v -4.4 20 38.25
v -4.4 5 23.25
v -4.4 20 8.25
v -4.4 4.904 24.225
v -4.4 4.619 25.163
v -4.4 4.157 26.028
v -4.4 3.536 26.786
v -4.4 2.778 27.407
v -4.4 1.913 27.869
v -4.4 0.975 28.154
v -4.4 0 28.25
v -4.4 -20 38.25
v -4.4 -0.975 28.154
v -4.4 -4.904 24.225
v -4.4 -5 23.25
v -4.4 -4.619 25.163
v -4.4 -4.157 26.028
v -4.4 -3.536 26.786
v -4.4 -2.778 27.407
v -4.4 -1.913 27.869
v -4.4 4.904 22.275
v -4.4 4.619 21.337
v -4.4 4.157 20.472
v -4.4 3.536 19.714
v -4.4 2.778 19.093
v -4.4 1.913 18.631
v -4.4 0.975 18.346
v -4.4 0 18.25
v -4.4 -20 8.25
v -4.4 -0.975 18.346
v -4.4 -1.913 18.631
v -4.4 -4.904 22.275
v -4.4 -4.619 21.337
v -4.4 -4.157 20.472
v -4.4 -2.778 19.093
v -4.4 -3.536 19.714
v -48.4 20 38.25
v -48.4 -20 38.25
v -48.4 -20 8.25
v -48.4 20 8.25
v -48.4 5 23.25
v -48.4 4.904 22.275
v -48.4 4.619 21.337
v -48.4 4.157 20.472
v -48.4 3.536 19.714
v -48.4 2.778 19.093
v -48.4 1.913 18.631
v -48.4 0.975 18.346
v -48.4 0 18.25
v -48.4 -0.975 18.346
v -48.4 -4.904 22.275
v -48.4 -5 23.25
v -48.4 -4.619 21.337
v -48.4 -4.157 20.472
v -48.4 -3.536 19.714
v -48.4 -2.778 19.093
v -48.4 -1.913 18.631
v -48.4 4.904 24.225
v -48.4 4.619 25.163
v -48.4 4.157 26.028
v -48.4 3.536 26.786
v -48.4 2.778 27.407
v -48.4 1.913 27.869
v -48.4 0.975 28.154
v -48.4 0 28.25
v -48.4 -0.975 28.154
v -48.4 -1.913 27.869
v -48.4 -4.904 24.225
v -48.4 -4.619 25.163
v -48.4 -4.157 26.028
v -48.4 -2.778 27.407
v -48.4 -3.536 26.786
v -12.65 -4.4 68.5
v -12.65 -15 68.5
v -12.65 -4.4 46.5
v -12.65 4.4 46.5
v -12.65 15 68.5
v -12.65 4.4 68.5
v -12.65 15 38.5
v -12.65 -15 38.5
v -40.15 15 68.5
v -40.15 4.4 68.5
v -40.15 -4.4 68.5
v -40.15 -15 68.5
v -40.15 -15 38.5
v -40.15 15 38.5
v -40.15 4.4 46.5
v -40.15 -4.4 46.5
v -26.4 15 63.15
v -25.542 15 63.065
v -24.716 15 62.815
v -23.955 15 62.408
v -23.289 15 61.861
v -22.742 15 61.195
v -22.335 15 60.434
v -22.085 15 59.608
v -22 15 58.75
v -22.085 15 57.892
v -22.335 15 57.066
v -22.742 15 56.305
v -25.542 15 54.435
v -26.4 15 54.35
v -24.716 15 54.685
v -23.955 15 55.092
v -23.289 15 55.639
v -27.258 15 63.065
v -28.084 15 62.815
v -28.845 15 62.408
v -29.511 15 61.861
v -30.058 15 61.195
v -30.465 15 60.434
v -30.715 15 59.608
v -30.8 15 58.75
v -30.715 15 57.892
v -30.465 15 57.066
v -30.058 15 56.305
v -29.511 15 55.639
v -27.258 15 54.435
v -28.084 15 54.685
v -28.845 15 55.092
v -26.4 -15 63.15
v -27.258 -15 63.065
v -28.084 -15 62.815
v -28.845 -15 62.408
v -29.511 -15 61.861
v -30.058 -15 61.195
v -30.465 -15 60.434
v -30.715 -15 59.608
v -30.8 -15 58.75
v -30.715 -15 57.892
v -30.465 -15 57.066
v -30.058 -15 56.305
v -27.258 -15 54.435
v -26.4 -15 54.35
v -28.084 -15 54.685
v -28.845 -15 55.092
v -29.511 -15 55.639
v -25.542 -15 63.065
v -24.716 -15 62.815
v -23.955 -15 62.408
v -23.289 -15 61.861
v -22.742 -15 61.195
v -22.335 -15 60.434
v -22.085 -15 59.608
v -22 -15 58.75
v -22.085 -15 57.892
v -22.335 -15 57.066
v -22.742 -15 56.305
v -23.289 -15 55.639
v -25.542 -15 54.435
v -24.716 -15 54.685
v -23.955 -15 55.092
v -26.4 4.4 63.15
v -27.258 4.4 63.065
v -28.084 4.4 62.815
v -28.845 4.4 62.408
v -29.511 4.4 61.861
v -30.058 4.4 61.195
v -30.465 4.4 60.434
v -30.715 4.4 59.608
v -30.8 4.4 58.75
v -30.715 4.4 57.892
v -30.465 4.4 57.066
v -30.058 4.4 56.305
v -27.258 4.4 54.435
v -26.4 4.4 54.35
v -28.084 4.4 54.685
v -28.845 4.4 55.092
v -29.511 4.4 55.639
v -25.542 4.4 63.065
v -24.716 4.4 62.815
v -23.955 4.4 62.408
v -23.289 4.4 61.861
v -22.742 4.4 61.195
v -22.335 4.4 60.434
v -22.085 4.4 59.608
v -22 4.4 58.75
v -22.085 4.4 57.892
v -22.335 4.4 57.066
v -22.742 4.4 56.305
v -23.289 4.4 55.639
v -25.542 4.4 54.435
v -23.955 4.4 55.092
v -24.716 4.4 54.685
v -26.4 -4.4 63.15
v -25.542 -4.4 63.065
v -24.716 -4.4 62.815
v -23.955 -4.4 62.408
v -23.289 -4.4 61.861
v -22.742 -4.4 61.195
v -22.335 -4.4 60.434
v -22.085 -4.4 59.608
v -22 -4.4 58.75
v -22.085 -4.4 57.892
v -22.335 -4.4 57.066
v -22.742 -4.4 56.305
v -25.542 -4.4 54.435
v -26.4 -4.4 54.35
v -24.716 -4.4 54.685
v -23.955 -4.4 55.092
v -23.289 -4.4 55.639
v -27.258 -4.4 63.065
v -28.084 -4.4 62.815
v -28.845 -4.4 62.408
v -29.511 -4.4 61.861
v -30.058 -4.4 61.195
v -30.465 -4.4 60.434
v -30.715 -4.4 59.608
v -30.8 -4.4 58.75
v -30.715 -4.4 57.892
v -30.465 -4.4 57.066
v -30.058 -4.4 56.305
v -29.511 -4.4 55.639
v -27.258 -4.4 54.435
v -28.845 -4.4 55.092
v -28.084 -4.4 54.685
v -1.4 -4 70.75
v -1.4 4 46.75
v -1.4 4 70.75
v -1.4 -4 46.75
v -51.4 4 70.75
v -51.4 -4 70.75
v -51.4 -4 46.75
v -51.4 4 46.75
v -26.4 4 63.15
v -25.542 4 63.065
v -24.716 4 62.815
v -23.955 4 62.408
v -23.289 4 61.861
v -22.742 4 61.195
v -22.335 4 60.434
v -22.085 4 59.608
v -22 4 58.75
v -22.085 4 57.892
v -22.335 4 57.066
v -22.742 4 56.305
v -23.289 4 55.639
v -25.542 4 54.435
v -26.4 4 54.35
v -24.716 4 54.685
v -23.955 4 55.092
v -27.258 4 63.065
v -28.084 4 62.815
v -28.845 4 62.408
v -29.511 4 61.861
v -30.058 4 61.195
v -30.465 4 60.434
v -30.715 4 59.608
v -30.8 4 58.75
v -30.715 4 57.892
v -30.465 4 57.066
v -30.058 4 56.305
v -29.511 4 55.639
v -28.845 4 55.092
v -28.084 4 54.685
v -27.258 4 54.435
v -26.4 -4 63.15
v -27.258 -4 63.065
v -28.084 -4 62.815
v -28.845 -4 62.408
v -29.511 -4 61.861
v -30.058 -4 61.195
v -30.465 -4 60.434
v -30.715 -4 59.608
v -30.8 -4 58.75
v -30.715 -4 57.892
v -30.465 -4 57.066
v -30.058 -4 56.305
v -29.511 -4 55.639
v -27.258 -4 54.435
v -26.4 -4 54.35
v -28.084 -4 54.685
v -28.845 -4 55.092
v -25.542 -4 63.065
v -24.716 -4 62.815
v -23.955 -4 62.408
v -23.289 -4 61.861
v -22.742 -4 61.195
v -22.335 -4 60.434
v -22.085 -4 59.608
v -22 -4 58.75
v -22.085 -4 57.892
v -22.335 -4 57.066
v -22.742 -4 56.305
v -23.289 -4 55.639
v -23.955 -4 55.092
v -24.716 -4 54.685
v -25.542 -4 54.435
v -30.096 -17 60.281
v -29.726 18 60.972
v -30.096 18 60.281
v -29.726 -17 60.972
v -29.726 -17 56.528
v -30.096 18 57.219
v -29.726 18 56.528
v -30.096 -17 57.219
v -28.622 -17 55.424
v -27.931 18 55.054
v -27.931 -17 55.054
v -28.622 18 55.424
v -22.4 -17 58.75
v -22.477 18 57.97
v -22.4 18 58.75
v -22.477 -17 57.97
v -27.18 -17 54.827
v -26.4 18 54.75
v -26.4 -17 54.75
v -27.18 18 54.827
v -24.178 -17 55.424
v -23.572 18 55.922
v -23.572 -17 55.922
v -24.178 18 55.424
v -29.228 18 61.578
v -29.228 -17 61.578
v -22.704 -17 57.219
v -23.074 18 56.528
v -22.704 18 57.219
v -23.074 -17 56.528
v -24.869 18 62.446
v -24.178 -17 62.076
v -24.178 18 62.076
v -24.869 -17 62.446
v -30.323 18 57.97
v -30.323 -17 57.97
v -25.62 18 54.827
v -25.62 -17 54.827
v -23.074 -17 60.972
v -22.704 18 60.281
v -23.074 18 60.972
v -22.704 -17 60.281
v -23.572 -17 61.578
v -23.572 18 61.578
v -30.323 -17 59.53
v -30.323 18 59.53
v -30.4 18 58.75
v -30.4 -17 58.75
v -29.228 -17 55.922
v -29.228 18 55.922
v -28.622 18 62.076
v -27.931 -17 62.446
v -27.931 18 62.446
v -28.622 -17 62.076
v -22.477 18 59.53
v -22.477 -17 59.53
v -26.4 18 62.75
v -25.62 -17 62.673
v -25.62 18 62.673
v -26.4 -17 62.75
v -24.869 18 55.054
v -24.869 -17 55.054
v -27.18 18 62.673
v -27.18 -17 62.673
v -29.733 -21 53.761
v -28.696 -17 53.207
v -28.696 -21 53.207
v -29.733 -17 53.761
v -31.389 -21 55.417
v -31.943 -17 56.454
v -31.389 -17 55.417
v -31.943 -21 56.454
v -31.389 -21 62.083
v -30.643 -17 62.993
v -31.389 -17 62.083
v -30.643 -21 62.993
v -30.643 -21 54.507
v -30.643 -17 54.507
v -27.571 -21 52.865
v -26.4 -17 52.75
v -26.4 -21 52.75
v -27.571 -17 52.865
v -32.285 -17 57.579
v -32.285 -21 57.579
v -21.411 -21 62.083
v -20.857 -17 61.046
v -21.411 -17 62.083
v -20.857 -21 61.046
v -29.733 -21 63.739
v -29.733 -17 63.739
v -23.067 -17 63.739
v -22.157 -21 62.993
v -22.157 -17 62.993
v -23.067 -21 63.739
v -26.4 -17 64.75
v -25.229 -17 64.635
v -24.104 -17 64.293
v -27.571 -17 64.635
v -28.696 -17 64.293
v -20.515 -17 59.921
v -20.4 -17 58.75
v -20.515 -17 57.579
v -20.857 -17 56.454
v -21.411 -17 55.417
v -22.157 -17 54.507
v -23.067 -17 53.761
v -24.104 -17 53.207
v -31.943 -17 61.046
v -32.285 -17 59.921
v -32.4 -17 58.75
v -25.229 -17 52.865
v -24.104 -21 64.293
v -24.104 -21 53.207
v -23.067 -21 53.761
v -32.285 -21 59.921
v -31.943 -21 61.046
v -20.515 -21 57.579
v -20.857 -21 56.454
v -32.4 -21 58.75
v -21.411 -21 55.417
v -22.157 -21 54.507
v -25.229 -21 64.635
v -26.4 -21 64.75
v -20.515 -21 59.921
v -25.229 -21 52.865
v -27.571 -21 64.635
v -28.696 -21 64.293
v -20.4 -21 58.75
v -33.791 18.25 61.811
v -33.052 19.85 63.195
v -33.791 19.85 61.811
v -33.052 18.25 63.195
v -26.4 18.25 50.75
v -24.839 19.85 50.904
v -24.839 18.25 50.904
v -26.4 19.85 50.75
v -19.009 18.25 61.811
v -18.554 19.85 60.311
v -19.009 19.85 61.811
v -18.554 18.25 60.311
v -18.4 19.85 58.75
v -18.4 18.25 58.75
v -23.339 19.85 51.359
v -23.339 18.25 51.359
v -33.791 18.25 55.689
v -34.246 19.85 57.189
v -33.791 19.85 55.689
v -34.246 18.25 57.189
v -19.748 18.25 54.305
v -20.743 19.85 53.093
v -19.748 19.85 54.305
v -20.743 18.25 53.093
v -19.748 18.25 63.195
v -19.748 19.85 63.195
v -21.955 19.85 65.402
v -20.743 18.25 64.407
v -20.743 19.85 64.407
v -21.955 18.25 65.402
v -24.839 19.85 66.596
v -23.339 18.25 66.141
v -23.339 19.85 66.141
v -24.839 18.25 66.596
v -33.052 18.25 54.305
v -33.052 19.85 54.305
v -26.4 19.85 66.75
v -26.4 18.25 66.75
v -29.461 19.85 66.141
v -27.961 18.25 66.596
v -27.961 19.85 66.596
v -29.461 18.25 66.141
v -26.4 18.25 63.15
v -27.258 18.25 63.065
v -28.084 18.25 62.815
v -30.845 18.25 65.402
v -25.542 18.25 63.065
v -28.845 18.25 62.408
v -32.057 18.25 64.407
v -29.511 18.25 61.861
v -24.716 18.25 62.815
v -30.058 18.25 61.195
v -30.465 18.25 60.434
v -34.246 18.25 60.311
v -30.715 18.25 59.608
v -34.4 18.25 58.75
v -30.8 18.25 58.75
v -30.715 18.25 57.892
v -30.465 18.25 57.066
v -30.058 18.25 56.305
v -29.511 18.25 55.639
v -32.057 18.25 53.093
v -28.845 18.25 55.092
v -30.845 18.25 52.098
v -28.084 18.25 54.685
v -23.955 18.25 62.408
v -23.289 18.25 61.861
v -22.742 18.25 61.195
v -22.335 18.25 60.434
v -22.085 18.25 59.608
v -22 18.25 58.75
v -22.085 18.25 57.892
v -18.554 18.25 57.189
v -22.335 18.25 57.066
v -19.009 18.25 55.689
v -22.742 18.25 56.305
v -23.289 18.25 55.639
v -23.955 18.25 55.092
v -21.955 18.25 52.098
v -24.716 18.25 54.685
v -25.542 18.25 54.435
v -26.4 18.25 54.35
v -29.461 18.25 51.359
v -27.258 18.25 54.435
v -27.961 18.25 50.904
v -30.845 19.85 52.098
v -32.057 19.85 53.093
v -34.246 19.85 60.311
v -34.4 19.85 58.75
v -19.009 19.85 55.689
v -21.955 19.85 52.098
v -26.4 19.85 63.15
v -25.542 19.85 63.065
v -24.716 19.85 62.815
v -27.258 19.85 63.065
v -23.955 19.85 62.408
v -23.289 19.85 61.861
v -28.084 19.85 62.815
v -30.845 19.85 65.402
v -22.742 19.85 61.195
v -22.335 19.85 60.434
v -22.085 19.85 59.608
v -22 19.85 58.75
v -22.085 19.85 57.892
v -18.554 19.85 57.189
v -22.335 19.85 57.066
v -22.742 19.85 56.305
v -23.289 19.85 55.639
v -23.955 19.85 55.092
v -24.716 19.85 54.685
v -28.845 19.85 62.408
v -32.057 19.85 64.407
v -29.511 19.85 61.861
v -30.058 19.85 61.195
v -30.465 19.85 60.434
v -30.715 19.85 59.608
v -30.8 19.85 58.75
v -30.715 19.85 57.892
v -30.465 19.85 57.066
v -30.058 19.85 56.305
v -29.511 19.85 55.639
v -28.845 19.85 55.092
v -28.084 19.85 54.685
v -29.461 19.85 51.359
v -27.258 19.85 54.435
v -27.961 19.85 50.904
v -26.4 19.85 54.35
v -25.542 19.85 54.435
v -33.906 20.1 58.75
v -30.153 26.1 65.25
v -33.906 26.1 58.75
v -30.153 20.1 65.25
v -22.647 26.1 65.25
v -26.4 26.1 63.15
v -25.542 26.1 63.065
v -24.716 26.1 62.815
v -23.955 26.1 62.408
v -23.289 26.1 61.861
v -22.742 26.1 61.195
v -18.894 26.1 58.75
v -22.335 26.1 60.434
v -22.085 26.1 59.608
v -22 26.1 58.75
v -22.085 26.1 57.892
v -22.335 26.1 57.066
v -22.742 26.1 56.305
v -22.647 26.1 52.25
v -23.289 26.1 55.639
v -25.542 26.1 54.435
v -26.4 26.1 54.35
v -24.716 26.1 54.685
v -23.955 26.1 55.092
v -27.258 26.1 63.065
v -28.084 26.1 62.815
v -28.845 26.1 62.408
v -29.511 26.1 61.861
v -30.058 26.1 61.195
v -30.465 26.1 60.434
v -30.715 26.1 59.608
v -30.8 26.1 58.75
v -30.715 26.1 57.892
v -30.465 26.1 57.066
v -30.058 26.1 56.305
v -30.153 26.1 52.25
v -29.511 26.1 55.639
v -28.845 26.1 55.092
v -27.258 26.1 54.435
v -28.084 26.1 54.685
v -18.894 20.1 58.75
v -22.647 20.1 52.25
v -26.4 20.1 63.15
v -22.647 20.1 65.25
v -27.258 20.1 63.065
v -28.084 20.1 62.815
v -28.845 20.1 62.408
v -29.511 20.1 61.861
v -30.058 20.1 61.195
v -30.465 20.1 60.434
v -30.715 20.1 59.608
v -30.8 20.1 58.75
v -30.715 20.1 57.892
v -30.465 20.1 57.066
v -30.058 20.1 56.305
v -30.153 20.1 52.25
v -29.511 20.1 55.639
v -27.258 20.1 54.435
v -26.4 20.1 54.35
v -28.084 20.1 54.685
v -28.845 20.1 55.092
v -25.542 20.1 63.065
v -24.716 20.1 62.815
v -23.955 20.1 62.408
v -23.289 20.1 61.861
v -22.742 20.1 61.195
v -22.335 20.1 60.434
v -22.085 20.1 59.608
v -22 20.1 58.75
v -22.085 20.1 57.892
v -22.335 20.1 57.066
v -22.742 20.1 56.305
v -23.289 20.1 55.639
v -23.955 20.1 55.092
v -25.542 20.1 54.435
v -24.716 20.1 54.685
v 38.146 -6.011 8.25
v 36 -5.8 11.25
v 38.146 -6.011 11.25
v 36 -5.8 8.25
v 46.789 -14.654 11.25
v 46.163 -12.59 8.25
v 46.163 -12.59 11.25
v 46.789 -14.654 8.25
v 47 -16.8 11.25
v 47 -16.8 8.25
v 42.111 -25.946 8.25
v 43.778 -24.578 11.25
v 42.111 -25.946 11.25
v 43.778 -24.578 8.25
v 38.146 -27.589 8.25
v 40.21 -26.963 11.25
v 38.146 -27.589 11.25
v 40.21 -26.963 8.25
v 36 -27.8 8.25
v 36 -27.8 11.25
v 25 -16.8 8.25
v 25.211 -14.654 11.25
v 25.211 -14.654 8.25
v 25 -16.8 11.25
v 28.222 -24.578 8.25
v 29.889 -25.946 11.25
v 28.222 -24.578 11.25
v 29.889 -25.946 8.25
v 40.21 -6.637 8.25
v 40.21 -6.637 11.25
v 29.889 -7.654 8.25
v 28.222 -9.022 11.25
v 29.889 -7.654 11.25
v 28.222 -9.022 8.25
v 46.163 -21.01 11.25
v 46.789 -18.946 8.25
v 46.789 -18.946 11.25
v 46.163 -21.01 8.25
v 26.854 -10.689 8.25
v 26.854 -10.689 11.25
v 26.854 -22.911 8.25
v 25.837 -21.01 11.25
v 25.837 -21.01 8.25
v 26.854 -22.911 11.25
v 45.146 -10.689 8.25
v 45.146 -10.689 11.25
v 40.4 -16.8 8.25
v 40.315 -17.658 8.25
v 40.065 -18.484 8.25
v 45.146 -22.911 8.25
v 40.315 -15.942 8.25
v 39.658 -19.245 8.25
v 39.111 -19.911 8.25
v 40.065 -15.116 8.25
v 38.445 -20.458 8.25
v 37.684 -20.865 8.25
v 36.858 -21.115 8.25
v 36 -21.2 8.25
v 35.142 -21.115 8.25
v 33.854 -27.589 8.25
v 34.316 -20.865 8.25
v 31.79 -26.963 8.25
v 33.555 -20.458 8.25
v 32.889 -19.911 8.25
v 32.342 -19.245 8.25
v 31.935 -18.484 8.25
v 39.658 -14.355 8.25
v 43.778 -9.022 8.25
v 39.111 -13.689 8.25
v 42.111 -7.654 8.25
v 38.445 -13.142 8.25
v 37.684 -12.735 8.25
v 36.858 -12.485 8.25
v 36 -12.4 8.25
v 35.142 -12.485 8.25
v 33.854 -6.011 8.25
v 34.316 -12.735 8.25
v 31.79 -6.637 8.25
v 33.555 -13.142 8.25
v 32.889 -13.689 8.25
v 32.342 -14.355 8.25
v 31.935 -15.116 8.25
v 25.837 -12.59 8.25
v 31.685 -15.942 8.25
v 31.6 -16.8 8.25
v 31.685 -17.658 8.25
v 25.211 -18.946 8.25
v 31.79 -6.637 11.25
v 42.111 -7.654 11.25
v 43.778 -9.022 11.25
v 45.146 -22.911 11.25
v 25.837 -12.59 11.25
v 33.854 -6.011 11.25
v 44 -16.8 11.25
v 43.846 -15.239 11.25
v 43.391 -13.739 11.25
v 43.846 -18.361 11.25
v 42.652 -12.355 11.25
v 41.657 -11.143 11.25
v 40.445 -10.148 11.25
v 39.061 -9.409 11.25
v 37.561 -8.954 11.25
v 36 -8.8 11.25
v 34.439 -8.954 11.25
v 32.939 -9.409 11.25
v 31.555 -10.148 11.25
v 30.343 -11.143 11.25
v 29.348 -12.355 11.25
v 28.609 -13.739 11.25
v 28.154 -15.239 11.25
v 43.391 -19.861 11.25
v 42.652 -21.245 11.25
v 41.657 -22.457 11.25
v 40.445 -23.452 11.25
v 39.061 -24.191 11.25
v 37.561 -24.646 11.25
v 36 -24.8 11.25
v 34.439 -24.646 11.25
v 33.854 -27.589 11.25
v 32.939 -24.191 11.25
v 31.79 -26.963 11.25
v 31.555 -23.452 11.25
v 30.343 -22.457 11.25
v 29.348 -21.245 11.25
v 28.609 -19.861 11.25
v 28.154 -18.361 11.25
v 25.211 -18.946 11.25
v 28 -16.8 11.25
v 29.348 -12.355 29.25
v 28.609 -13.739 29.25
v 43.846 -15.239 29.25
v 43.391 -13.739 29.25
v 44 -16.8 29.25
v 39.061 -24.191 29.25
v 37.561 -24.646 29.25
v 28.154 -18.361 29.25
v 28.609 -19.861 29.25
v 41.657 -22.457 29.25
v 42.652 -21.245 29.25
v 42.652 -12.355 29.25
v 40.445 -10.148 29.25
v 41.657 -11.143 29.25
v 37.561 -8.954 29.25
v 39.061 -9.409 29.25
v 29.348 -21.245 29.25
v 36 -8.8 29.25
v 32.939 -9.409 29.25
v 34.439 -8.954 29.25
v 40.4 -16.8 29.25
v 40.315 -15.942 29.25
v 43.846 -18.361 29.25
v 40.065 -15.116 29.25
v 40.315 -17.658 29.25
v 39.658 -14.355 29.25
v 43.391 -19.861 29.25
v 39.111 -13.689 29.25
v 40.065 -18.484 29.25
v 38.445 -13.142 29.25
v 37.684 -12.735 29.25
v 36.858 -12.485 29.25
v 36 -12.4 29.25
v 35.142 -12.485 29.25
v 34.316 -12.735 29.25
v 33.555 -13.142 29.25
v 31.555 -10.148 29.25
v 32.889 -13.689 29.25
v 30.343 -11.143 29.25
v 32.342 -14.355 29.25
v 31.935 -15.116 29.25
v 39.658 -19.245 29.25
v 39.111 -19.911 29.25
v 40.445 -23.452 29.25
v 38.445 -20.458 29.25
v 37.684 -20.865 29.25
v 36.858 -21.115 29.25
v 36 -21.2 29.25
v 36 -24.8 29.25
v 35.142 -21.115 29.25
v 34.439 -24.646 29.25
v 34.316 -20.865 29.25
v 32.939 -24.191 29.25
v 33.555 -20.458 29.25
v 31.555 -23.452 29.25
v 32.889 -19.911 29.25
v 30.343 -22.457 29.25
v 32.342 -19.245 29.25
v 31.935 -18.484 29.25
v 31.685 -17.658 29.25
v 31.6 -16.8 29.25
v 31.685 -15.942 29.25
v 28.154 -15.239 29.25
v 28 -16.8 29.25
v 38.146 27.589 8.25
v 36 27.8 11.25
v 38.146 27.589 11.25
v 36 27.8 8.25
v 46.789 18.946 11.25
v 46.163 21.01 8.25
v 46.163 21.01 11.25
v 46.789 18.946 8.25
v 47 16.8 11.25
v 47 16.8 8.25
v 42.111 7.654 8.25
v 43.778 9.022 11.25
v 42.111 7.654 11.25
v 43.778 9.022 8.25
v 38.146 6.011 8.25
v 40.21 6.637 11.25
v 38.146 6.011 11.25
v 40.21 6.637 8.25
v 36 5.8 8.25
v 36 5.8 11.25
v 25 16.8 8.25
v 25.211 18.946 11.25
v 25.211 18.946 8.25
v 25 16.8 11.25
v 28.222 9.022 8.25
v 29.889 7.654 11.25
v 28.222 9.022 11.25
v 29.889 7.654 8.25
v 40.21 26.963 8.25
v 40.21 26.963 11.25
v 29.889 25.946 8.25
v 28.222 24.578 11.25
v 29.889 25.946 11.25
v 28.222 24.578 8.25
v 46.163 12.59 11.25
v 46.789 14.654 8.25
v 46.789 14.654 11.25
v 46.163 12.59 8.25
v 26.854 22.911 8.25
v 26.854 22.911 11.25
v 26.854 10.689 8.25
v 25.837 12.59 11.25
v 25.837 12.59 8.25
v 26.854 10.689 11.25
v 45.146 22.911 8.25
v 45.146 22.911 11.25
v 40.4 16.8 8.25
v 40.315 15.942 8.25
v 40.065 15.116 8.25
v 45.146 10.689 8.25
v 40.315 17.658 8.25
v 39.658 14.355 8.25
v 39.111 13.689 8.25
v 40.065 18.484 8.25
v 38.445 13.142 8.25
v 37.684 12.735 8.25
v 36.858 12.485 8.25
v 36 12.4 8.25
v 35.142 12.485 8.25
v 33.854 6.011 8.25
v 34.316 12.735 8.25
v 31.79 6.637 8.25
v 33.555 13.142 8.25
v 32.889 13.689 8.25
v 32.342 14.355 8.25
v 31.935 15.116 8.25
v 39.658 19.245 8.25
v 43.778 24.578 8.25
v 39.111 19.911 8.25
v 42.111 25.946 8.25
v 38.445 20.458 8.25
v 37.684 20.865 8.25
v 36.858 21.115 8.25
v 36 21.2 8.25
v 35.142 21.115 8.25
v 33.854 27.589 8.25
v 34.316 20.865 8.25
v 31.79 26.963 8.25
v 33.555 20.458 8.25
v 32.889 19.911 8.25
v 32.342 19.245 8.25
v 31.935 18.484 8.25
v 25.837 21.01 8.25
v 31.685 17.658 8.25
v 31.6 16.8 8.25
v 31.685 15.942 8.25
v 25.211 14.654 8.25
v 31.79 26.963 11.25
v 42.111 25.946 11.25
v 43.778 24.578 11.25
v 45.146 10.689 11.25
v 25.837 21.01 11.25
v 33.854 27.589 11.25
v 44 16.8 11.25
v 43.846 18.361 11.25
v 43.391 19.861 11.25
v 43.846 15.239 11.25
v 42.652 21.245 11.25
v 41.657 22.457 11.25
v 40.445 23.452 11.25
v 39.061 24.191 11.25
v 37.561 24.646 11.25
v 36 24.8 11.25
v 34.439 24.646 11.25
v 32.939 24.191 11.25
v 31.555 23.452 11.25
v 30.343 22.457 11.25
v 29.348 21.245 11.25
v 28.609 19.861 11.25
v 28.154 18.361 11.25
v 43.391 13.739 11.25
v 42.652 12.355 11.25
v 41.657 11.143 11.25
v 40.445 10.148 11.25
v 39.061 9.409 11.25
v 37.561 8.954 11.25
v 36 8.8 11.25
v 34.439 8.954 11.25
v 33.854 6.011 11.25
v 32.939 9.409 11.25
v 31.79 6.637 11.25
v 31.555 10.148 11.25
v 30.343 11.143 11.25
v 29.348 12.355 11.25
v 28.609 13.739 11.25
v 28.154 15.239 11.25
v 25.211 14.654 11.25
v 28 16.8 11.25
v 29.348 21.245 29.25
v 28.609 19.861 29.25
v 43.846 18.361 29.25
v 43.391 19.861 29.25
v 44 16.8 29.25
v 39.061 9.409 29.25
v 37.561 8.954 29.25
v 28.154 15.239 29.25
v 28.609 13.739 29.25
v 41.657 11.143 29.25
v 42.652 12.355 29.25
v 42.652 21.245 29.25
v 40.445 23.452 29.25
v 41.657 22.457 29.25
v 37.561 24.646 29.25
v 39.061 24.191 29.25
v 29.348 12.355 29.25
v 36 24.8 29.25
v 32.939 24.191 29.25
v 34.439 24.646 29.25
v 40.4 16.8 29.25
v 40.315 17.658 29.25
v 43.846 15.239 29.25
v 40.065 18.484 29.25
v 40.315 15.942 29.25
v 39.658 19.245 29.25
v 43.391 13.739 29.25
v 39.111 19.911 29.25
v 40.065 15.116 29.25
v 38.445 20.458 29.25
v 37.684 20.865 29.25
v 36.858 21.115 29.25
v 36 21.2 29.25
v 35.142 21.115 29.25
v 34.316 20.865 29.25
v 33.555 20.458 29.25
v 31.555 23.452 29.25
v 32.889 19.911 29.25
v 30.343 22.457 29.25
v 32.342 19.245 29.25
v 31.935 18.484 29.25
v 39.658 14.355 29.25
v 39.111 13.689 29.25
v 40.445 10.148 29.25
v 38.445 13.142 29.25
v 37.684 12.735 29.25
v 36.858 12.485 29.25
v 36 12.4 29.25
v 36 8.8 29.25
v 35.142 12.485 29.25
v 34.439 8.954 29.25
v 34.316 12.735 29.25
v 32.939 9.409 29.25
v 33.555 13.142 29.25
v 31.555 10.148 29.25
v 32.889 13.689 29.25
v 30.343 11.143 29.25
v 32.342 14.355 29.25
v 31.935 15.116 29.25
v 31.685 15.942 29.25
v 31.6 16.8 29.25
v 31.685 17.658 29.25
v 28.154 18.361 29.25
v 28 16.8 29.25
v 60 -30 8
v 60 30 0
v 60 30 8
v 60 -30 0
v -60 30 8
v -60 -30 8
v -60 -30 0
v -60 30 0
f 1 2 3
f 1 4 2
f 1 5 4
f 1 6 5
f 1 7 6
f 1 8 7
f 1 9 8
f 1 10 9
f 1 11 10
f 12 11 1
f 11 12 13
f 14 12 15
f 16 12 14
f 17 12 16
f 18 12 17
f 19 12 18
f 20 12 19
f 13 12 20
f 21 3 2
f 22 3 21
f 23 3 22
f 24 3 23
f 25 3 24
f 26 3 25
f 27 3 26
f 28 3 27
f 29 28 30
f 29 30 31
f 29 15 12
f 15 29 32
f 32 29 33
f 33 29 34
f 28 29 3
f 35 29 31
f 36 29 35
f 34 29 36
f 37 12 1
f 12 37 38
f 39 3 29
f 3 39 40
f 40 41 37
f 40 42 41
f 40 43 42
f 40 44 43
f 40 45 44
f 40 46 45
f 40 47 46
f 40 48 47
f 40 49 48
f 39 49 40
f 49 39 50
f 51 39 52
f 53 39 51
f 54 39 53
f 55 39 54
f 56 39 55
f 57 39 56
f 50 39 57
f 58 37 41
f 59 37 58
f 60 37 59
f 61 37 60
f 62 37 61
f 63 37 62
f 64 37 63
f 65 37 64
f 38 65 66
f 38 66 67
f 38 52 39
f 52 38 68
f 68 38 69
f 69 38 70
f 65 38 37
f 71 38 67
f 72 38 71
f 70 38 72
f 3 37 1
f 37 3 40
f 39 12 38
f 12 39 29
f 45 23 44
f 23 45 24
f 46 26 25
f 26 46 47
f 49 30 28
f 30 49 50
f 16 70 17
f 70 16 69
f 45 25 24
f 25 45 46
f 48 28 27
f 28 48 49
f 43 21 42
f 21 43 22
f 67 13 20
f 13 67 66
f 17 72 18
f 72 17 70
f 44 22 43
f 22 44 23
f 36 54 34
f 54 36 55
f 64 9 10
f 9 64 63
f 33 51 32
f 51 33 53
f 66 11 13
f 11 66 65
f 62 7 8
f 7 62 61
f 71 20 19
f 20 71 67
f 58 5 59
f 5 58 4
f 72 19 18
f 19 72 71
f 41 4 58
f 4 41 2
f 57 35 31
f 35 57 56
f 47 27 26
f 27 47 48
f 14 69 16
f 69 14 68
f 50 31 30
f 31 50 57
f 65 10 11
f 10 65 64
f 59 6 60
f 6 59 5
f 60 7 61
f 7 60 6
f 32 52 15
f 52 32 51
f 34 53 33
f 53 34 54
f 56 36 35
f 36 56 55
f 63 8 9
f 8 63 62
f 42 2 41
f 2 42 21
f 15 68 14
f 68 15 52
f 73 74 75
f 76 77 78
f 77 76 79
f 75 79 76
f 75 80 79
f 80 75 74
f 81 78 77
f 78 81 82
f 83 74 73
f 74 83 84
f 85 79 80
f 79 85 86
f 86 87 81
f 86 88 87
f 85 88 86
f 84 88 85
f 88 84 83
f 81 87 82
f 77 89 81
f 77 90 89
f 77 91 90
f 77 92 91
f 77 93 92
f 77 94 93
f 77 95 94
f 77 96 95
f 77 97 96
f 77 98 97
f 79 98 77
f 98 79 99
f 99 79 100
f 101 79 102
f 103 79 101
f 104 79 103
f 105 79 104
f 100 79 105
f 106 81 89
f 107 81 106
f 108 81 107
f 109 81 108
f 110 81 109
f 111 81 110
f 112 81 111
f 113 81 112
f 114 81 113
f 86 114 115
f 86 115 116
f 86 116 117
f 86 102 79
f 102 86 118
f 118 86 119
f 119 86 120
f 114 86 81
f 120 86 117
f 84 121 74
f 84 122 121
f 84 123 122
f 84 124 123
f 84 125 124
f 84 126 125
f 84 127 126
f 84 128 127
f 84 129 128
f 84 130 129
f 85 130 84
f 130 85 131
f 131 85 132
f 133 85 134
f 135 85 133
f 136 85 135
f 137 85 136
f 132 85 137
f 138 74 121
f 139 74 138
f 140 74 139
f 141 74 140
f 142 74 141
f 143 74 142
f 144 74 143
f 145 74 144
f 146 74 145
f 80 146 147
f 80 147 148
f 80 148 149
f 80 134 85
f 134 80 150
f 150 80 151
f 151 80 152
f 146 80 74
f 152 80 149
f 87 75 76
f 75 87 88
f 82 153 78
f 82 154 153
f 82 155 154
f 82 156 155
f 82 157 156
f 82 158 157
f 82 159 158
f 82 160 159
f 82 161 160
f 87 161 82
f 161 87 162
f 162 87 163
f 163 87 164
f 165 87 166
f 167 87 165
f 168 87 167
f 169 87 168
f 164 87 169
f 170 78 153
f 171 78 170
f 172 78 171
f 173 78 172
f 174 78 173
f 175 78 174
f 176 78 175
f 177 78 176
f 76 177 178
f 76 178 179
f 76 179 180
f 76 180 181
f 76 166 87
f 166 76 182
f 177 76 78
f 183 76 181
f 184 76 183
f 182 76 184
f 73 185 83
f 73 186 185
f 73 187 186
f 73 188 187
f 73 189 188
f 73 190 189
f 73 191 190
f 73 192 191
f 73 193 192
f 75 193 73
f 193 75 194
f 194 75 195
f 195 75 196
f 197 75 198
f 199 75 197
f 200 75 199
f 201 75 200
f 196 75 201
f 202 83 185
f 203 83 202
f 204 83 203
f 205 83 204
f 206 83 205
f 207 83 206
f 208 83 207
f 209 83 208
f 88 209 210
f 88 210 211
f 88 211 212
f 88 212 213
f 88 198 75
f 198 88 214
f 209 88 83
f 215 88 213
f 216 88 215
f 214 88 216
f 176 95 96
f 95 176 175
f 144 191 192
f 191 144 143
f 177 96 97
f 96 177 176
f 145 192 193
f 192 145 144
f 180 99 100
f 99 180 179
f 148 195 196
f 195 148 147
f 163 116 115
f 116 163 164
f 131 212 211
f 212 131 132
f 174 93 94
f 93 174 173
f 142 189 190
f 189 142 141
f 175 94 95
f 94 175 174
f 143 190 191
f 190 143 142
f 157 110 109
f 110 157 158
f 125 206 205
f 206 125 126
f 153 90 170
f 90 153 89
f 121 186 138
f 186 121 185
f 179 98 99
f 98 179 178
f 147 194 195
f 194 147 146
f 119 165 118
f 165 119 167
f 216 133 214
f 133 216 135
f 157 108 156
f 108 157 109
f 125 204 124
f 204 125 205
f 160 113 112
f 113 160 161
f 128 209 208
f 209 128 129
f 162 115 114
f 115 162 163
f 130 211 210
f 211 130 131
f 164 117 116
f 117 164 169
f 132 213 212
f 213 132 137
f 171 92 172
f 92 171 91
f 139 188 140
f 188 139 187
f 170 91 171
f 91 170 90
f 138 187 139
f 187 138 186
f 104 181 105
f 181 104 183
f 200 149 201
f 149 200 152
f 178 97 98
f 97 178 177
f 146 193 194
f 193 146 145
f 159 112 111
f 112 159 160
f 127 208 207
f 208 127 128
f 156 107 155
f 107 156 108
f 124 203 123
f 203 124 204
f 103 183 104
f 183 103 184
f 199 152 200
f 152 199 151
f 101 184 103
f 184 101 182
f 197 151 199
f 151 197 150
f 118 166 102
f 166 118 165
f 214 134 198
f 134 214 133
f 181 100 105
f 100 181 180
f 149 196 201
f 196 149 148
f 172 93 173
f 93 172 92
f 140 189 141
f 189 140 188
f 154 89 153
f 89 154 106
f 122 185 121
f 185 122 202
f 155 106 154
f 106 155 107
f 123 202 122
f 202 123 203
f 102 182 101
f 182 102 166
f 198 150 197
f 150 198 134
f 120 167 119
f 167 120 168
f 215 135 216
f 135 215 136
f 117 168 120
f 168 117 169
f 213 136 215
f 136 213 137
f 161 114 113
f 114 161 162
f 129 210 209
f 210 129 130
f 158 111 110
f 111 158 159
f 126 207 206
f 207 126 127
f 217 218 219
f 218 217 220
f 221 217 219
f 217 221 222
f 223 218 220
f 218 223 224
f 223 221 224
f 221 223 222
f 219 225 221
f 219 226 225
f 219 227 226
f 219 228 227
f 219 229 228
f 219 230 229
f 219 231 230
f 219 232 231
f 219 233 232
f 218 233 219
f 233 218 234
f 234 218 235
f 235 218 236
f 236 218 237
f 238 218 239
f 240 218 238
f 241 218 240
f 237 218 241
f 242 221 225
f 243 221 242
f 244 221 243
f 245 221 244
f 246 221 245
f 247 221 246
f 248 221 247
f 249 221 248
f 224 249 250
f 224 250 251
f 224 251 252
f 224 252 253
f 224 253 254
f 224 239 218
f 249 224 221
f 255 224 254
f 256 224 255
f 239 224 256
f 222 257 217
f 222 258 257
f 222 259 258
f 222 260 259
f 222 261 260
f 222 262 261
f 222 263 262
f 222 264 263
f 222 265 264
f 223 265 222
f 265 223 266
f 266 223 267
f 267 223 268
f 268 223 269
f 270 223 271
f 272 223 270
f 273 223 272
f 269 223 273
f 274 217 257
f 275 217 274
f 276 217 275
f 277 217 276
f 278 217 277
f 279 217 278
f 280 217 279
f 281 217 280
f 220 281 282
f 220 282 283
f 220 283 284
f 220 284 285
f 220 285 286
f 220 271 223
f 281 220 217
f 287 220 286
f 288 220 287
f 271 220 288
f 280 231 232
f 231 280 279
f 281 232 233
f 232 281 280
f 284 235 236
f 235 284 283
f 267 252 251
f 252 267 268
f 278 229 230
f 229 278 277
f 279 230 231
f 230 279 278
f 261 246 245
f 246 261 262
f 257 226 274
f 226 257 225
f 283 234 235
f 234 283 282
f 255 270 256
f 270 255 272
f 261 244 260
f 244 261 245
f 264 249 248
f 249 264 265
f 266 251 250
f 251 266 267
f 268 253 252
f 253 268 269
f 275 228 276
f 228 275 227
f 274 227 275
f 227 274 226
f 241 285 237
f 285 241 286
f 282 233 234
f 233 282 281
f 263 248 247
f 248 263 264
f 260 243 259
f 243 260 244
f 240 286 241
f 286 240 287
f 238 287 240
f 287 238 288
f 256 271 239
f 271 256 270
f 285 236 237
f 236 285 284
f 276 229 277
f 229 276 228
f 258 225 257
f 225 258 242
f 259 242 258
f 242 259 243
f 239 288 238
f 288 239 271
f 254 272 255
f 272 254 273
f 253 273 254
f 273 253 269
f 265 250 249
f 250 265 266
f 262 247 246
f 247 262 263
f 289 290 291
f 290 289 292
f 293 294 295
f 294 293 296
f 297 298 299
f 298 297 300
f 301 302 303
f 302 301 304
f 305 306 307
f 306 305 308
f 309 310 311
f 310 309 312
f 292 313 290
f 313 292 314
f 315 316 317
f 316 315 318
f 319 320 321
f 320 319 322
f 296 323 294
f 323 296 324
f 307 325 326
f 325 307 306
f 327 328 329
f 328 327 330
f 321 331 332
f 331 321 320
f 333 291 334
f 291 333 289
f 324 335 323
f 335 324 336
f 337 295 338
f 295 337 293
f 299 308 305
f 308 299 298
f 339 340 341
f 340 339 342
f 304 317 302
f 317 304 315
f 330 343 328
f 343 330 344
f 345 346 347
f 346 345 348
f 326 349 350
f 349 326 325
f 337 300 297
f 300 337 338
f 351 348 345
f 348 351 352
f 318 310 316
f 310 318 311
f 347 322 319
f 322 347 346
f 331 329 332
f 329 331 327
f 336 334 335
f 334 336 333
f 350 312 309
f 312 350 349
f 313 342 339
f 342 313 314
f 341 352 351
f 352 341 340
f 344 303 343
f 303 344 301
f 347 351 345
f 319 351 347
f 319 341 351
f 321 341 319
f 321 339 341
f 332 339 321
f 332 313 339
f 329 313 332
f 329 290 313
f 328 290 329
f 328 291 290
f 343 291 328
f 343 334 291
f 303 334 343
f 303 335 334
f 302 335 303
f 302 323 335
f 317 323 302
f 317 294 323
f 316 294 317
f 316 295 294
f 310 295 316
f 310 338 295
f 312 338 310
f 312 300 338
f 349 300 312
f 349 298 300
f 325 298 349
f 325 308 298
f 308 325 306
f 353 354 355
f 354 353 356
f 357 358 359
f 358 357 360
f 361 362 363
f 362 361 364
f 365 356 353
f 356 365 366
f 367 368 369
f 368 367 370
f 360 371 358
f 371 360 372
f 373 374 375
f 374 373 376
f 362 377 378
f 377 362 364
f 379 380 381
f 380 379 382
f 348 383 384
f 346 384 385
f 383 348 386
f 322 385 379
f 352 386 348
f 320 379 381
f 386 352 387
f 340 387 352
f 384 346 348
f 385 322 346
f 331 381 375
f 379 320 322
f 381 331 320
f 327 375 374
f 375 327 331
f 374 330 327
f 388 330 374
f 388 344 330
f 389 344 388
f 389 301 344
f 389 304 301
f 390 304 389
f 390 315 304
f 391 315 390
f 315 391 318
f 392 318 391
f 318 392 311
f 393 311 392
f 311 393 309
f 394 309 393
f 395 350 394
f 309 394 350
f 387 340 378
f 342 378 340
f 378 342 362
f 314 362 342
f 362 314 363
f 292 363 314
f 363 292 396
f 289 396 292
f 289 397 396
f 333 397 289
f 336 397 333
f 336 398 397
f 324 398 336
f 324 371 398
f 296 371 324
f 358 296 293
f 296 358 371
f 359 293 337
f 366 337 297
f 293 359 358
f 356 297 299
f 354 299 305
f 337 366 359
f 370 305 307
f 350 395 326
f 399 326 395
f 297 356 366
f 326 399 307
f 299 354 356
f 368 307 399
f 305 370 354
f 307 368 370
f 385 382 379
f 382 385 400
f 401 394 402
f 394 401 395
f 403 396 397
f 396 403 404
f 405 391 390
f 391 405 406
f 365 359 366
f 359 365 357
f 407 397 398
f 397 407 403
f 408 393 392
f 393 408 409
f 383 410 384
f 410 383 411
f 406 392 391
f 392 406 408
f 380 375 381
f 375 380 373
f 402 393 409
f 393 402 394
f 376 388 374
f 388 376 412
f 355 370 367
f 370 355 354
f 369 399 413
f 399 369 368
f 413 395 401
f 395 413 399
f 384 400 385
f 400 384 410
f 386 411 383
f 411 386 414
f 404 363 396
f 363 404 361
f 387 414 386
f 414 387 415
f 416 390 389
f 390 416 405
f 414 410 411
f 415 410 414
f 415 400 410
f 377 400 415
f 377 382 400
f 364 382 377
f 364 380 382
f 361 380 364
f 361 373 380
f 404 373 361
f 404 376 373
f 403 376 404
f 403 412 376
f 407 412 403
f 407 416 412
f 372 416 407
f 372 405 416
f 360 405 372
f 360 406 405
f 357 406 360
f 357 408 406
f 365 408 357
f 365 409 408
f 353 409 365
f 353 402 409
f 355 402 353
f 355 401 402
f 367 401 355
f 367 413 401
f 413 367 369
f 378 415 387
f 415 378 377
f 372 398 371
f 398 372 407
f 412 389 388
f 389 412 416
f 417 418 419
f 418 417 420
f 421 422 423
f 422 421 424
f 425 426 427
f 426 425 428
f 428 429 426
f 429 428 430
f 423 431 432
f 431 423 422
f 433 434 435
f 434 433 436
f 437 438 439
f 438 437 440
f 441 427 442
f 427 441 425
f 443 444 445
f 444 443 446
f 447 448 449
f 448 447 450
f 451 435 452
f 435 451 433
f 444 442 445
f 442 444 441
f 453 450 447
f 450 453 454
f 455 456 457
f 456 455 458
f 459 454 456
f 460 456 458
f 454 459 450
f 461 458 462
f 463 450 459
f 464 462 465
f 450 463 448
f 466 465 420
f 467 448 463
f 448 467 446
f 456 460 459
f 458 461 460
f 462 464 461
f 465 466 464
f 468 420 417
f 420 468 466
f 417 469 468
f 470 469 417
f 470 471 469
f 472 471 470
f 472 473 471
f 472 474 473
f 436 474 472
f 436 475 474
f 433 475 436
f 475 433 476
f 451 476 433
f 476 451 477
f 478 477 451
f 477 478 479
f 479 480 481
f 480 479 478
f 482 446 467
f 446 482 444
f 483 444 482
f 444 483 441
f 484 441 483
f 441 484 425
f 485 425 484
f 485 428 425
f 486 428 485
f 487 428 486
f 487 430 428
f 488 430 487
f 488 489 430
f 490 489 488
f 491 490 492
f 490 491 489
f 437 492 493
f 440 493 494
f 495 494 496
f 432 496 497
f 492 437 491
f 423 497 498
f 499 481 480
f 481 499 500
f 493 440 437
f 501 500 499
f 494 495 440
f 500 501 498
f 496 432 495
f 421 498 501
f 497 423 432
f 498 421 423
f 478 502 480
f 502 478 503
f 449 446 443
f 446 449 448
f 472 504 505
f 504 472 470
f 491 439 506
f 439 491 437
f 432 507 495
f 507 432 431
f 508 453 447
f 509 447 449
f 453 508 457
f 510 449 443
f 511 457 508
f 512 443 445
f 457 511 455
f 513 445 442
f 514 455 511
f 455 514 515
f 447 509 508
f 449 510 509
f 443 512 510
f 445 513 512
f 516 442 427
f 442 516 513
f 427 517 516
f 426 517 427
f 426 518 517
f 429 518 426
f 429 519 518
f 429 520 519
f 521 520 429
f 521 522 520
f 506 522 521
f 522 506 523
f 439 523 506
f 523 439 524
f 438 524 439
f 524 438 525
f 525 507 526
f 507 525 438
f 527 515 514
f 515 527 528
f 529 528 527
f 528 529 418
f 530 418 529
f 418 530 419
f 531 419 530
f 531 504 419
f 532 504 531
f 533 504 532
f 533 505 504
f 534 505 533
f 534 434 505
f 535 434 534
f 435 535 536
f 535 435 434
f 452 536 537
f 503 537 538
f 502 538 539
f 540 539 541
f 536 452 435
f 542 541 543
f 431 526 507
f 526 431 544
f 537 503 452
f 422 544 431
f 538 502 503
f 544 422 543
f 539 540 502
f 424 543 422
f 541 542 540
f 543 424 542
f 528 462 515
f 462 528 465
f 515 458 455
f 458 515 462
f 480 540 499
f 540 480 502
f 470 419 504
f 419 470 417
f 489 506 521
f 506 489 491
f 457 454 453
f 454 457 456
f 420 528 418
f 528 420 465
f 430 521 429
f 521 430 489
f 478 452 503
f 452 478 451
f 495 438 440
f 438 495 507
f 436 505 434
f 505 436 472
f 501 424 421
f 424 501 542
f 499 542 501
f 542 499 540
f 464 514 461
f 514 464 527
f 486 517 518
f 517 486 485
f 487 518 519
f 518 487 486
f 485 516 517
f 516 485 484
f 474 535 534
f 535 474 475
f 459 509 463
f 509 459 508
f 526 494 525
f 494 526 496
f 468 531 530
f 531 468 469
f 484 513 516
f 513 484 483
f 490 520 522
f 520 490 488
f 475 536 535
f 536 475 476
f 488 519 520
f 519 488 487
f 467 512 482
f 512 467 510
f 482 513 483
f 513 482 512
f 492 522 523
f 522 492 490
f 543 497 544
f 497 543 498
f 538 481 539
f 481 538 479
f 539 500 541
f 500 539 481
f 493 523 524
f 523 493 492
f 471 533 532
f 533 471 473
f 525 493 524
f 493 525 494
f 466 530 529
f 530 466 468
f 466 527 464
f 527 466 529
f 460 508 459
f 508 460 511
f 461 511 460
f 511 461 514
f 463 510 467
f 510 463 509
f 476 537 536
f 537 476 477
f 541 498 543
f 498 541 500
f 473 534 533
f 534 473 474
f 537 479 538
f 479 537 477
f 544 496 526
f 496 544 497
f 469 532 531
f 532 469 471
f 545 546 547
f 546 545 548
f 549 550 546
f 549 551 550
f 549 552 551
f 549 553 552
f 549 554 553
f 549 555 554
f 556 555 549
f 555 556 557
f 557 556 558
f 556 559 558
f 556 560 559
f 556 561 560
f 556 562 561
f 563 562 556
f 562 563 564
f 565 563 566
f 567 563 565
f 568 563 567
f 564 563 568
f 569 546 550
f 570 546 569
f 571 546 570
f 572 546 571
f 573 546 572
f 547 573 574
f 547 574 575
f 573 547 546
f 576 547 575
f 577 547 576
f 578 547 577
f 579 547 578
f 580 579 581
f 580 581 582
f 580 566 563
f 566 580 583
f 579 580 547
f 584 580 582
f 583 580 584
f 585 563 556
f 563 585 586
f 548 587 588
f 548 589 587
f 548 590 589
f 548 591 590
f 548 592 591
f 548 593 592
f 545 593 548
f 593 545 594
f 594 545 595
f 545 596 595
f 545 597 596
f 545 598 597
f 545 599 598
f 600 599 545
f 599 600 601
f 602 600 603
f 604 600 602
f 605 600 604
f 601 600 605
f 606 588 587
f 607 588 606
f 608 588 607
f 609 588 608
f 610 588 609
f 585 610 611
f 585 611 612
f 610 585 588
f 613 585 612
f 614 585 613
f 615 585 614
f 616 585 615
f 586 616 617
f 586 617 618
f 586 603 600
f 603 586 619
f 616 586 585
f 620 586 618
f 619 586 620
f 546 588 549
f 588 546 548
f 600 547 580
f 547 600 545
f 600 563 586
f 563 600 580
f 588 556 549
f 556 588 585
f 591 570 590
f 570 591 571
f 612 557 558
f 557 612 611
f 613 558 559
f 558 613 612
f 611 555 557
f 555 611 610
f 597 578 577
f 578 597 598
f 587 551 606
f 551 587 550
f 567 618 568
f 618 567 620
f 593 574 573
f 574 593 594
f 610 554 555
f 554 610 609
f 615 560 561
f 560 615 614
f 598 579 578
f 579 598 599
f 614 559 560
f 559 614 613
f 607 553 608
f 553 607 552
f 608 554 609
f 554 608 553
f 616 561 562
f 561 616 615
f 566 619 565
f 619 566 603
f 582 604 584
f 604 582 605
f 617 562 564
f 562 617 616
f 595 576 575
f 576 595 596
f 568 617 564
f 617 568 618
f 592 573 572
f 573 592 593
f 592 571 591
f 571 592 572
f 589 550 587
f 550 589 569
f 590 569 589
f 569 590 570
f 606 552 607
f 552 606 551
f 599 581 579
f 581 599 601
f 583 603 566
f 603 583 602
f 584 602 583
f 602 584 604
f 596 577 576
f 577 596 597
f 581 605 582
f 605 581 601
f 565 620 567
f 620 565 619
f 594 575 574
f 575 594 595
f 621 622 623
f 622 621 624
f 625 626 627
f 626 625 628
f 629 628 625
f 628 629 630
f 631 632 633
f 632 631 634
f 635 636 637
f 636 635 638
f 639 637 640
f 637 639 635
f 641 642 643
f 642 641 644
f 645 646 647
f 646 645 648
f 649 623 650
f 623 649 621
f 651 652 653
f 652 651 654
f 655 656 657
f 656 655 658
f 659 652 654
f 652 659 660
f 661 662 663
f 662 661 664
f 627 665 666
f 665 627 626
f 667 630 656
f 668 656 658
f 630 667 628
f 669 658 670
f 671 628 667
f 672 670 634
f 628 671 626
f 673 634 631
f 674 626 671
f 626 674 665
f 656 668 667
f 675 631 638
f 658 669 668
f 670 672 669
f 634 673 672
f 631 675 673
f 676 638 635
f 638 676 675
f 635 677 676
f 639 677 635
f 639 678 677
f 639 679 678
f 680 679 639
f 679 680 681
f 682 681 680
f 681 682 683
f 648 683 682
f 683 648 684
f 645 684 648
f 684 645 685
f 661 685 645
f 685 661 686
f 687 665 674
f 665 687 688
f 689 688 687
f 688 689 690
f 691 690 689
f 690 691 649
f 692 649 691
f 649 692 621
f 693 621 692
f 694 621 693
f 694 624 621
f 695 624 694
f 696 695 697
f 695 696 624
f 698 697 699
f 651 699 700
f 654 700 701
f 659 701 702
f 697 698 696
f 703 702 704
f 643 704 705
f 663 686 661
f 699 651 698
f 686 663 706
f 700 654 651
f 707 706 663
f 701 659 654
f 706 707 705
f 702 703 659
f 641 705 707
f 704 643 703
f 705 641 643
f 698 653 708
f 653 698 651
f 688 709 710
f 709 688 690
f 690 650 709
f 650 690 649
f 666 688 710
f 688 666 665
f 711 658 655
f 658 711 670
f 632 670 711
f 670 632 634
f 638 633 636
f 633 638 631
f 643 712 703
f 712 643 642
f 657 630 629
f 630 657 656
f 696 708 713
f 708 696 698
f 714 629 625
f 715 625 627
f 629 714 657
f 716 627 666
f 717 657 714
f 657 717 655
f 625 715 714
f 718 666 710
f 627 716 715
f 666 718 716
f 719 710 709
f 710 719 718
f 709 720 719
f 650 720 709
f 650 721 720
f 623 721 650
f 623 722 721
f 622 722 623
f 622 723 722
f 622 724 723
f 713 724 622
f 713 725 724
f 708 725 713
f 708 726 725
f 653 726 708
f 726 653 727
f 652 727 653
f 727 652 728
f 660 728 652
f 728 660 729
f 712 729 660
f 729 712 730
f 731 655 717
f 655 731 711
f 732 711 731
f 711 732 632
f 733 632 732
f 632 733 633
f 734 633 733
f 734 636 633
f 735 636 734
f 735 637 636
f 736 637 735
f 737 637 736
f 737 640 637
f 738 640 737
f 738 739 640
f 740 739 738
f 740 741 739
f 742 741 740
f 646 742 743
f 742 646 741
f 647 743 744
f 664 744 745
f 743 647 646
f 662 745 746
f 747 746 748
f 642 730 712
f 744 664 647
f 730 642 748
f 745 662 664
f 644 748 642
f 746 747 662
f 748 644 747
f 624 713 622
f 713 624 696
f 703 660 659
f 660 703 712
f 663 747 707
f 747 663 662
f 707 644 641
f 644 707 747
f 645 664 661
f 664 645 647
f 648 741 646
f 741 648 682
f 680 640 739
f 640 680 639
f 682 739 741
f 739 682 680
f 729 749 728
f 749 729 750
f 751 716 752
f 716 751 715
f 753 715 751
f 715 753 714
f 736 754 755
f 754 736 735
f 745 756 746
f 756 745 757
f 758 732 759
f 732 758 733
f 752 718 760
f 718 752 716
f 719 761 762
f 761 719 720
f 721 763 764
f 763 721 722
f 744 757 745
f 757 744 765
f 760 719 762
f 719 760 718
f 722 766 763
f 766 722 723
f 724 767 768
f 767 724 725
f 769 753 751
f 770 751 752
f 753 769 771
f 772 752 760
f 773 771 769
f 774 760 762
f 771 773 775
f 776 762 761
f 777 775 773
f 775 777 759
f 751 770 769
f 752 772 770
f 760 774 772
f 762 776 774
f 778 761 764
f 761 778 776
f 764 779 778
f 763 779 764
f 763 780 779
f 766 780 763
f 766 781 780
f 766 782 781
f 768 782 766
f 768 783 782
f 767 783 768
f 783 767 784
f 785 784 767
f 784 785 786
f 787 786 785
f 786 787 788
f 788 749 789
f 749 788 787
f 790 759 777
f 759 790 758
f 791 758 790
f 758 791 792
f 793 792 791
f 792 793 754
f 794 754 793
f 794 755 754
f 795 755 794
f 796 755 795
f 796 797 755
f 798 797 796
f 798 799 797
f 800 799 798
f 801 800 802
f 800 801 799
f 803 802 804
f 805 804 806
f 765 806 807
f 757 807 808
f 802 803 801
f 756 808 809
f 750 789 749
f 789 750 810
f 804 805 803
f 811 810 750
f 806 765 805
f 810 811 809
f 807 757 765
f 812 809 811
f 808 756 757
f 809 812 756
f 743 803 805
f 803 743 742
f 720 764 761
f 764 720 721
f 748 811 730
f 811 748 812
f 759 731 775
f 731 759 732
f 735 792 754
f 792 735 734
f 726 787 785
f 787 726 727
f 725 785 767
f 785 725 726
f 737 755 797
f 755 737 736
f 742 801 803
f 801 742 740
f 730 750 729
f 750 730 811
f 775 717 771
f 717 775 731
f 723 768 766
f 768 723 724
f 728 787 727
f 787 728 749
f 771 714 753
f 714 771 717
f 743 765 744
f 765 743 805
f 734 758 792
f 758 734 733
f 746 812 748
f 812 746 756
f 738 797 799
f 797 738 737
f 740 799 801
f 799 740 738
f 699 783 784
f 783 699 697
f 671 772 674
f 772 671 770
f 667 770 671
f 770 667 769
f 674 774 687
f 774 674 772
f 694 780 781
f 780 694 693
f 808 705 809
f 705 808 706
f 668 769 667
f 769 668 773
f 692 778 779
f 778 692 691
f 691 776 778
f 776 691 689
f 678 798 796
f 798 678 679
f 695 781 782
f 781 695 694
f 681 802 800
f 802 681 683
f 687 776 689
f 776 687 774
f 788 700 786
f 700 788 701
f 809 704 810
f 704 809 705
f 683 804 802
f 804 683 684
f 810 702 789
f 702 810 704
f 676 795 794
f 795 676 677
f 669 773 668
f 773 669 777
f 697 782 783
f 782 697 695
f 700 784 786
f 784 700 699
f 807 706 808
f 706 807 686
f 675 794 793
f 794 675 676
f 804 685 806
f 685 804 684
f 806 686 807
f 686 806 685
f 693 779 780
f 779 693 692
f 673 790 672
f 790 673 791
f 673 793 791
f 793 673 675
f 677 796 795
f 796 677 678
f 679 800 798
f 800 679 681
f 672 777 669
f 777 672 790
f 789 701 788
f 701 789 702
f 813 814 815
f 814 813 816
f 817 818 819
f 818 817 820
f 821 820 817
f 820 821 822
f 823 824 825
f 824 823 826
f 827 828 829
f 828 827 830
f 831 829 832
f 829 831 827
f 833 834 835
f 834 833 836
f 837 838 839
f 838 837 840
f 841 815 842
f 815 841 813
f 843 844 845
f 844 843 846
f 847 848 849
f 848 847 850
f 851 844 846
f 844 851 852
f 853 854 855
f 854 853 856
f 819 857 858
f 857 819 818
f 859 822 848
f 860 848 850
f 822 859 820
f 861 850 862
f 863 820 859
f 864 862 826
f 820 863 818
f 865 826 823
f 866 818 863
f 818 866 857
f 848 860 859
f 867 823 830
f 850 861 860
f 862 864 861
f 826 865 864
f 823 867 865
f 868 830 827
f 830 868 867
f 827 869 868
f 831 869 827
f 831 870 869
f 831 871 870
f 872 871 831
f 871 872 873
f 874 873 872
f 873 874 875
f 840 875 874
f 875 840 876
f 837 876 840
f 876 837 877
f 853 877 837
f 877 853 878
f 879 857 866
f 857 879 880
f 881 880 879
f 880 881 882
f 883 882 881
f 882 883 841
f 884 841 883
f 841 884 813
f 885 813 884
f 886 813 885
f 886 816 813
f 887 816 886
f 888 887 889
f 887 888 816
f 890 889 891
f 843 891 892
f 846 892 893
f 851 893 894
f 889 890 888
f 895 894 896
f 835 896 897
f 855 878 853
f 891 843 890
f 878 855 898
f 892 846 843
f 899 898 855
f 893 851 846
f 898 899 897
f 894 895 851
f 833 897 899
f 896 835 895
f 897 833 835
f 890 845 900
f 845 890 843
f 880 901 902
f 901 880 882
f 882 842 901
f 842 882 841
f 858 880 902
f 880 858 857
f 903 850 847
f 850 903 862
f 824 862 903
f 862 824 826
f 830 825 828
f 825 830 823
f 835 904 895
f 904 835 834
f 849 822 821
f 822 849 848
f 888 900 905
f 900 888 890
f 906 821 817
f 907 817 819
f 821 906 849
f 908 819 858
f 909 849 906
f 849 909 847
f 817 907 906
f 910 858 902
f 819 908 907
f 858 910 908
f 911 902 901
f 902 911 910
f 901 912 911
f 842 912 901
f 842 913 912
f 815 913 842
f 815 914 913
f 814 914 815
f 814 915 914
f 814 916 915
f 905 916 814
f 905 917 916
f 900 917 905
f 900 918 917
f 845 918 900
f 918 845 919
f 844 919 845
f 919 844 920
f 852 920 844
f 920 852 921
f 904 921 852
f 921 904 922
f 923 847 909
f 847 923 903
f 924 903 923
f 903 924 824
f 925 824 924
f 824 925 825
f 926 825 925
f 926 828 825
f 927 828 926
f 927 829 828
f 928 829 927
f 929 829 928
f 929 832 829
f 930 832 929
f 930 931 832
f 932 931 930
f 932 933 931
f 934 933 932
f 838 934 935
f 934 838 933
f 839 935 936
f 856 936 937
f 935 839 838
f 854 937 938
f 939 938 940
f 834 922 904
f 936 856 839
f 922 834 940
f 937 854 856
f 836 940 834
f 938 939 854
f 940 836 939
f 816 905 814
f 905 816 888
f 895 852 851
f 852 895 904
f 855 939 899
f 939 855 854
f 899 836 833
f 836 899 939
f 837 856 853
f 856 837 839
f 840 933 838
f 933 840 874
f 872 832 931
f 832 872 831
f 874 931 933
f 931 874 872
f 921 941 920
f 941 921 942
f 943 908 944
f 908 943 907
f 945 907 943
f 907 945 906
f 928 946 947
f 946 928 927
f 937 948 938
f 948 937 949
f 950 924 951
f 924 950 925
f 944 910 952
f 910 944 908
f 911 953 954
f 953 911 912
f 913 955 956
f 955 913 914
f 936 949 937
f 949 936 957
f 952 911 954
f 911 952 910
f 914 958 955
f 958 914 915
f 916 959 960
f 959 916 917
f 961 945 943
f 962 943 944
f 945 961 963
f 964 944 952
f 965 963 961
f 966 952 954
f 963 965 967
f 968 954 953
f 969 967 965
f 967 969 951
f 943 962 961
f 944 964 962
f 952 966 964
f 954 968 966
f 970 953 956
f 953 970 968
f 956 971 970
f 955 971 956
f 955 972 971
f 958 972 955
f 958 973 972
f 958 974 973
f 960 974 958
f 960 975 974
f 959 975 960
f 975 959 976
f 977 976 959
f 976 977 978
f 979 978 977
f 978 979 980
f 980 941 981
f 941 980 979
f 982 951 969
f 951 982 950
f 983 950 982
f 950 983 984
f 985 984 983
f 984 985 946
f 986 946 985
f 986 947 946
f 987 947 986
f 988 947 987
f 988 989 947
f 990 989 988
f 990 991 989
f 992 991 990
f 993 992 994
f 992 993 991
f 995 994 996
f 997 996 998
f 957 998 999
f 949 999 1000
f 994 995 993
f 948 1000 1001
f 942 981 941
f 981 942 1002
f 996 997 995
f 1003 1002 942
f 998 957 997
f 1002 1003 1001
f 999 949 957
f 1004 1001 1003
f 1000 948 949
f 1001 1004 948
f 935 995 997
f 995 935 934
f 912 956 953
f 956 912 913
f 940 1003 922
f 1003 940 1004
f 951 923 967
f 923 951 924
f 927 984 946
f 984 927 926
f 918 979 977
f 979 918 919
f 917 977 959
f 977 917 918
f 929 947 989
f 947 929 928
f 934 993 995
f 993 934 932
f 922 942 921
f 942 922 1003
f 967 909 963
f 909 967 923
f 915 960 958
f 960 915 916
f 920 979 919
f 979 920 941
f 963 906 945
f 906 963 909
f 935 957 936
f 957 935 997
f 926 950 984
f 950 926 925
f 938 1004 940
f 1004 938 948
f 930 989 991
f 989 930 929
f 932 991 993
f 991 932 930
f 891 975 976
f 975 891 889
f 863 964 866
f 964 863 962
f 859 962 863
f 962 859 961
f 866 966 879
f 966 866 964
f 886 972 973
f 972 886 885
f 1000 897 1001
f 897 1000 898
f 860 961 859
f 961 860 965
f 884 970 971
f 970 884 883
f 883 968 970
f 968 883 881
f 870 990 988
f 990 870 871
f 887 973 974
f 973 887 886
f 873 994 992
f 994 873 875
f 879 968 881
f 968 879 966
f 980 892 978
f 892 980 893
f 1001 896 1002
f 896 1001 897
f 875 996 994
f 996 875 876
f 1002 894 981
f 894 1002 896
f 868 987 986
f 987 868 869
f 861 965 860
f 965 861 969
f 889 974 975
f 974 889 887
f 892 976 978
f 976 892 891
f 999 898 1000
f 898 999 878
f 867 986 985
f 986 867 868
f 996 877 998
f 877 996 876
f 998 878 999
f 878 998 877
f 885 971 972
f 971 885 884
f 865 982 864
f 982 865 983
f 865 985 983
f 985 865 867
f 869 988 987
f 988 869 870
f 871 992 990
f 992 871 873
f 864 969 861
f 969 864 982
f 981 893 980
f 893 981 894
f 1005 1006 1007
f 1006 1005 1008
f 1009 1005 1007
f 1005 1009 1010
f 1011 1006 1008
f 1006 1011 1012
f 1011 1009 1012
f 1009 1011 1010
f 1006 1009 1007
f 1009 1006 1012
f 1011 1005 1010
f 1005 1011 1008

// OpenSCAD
$fn = 32;

// ------------------------------------------------------------------------
// Indexing jig: plate 120 x 60 mm, pin d8
// Every part is its own module, assembly() places every instance.
// ------------------------------------------------------------------------

// --- part 1 ---
module jig_plate() {
  difference() {
    translate([-60, -30, 0]) cube([120, 60, 8]);
  }
}

// --- part 2 ---
module locator_block() {
  difference() {
    translate([-22, -20, 0]) cube([44, 40, 30]);
    translate([0, 0, 15]) rotate([0, 90, 0]) cylinder(h = 46, d = 10, center = true);
  }
}

// --- part 3 ---
module index_fork() {
  difference() {
    translate([-13.75, -15, 0]) cube([27.5, 30, 30]);
    translate([-14.75, -4.4, 8]) cube([29.5, 8.8, 23]);
    translate([0, 0, 20.25]) rotate([90, 0, 0]) cylinder(h = 32, d = 8.8, center = true);
  }
}

// --- part 4 ---
module index_arm() {
  difference() {
    translate([-25, -4, 0]) cube([50, 8, 24]);
    translate([0, 0, 12]) rotate([90, 0, 0]) cylinder(h = 10, d = 8.8, center = true);
  }
}

// --- part 5 ---
module index_pin() {
  rotate([0, 90, 0]) cylinder(h = 36, d = 8, center = true);
  translate([-21, 0, 0]) rotate([0, 90, 0]) cylinder(h = 4, d = 12);
}

// --- part 6 ---
module pin_washer() {
  difference() {
      translate([0, 0, 0]) cylinder(h = 1.6, d = 16);
      translate([0, 0, -1]) cylinder(h = 3.6, d = 8.8);
    }
}

// --- part 7 ---
module lock_nut() {
  difference() {
    linear_extrude(height = 6) polygon(points = [[7.506, 0], [3.753, 6.5], [-3.753, 6.5], [-7.506, 0], [-3.753, -6.5], [3.753, -6.5]]);
    translate([0, 0, -1]) cylinder(h = 8, d = 8.8);
  }
}

// --- part 8 ---
module guide_bush_a() {
  difference() {
    union() {
      cylinder(h = 3, d = 22);
      translate([0, 0, 3]) cylinder(h = 18, d = 16);
    }
    translate([0, 0, -1]) cylinder(h = 23, d = 8.8);
  }
}

// --- part 9 ---
module guide_bush_b() {
  difference() {
    union() {
      cylinder(h = 3, d = 22);
      translate([0, 0, 3]) cylinder(h = 18, d = 16);
    }
    translate([0, 0, -1]) cylinder(h = 23, d = 8.8);
  }
}

// --- assembly ---
module assembly() {
  color([0.80, 0.24, 0.20]) translate([0, 0, 0]) rotate([0, 0, 0]) jig_plate();
  color([0.20, 0.45, 0.75]) translate([-26.4, 0, 8.25]) rotate([0, 0, 0]) locator_block();
  color([0.25, 0.62, 0.32]) translate([-26.4, 0, 38.5]) rotate([0, 0, 0]) index_fork();
  color([0.92, 0.70, 0.18]) translate([-26.4, 0, 46.75]) rotate([0, 0, 0]) index_arm();
  color([0.58, 0.35, 0.70]) translate([-26.4, 0, 58.75]) rotate([0, 0, 90]) index_pin();
  color([0.16, 0.66, 0.66]) translate([-26.4, 19.85, 58.75]) rotate([90, 0, 0]) pin_washer();
  color([0.85, 0.48, 0.18]) translate([-26.4, 26.1, 58.75]) rotate([90, 0, 0]) lock_nut();
  color([0.55, 0.60, 0.65]) translate([36, -16.8, 8.25]) rotate([0, 0, 0]) guide_bush_a();
  color([0.75, 0.30, 0.55]) translate([36, 16.8, 8.25]) rotate([0, 0, 0]) guide_bush_b();
}

assembly();
